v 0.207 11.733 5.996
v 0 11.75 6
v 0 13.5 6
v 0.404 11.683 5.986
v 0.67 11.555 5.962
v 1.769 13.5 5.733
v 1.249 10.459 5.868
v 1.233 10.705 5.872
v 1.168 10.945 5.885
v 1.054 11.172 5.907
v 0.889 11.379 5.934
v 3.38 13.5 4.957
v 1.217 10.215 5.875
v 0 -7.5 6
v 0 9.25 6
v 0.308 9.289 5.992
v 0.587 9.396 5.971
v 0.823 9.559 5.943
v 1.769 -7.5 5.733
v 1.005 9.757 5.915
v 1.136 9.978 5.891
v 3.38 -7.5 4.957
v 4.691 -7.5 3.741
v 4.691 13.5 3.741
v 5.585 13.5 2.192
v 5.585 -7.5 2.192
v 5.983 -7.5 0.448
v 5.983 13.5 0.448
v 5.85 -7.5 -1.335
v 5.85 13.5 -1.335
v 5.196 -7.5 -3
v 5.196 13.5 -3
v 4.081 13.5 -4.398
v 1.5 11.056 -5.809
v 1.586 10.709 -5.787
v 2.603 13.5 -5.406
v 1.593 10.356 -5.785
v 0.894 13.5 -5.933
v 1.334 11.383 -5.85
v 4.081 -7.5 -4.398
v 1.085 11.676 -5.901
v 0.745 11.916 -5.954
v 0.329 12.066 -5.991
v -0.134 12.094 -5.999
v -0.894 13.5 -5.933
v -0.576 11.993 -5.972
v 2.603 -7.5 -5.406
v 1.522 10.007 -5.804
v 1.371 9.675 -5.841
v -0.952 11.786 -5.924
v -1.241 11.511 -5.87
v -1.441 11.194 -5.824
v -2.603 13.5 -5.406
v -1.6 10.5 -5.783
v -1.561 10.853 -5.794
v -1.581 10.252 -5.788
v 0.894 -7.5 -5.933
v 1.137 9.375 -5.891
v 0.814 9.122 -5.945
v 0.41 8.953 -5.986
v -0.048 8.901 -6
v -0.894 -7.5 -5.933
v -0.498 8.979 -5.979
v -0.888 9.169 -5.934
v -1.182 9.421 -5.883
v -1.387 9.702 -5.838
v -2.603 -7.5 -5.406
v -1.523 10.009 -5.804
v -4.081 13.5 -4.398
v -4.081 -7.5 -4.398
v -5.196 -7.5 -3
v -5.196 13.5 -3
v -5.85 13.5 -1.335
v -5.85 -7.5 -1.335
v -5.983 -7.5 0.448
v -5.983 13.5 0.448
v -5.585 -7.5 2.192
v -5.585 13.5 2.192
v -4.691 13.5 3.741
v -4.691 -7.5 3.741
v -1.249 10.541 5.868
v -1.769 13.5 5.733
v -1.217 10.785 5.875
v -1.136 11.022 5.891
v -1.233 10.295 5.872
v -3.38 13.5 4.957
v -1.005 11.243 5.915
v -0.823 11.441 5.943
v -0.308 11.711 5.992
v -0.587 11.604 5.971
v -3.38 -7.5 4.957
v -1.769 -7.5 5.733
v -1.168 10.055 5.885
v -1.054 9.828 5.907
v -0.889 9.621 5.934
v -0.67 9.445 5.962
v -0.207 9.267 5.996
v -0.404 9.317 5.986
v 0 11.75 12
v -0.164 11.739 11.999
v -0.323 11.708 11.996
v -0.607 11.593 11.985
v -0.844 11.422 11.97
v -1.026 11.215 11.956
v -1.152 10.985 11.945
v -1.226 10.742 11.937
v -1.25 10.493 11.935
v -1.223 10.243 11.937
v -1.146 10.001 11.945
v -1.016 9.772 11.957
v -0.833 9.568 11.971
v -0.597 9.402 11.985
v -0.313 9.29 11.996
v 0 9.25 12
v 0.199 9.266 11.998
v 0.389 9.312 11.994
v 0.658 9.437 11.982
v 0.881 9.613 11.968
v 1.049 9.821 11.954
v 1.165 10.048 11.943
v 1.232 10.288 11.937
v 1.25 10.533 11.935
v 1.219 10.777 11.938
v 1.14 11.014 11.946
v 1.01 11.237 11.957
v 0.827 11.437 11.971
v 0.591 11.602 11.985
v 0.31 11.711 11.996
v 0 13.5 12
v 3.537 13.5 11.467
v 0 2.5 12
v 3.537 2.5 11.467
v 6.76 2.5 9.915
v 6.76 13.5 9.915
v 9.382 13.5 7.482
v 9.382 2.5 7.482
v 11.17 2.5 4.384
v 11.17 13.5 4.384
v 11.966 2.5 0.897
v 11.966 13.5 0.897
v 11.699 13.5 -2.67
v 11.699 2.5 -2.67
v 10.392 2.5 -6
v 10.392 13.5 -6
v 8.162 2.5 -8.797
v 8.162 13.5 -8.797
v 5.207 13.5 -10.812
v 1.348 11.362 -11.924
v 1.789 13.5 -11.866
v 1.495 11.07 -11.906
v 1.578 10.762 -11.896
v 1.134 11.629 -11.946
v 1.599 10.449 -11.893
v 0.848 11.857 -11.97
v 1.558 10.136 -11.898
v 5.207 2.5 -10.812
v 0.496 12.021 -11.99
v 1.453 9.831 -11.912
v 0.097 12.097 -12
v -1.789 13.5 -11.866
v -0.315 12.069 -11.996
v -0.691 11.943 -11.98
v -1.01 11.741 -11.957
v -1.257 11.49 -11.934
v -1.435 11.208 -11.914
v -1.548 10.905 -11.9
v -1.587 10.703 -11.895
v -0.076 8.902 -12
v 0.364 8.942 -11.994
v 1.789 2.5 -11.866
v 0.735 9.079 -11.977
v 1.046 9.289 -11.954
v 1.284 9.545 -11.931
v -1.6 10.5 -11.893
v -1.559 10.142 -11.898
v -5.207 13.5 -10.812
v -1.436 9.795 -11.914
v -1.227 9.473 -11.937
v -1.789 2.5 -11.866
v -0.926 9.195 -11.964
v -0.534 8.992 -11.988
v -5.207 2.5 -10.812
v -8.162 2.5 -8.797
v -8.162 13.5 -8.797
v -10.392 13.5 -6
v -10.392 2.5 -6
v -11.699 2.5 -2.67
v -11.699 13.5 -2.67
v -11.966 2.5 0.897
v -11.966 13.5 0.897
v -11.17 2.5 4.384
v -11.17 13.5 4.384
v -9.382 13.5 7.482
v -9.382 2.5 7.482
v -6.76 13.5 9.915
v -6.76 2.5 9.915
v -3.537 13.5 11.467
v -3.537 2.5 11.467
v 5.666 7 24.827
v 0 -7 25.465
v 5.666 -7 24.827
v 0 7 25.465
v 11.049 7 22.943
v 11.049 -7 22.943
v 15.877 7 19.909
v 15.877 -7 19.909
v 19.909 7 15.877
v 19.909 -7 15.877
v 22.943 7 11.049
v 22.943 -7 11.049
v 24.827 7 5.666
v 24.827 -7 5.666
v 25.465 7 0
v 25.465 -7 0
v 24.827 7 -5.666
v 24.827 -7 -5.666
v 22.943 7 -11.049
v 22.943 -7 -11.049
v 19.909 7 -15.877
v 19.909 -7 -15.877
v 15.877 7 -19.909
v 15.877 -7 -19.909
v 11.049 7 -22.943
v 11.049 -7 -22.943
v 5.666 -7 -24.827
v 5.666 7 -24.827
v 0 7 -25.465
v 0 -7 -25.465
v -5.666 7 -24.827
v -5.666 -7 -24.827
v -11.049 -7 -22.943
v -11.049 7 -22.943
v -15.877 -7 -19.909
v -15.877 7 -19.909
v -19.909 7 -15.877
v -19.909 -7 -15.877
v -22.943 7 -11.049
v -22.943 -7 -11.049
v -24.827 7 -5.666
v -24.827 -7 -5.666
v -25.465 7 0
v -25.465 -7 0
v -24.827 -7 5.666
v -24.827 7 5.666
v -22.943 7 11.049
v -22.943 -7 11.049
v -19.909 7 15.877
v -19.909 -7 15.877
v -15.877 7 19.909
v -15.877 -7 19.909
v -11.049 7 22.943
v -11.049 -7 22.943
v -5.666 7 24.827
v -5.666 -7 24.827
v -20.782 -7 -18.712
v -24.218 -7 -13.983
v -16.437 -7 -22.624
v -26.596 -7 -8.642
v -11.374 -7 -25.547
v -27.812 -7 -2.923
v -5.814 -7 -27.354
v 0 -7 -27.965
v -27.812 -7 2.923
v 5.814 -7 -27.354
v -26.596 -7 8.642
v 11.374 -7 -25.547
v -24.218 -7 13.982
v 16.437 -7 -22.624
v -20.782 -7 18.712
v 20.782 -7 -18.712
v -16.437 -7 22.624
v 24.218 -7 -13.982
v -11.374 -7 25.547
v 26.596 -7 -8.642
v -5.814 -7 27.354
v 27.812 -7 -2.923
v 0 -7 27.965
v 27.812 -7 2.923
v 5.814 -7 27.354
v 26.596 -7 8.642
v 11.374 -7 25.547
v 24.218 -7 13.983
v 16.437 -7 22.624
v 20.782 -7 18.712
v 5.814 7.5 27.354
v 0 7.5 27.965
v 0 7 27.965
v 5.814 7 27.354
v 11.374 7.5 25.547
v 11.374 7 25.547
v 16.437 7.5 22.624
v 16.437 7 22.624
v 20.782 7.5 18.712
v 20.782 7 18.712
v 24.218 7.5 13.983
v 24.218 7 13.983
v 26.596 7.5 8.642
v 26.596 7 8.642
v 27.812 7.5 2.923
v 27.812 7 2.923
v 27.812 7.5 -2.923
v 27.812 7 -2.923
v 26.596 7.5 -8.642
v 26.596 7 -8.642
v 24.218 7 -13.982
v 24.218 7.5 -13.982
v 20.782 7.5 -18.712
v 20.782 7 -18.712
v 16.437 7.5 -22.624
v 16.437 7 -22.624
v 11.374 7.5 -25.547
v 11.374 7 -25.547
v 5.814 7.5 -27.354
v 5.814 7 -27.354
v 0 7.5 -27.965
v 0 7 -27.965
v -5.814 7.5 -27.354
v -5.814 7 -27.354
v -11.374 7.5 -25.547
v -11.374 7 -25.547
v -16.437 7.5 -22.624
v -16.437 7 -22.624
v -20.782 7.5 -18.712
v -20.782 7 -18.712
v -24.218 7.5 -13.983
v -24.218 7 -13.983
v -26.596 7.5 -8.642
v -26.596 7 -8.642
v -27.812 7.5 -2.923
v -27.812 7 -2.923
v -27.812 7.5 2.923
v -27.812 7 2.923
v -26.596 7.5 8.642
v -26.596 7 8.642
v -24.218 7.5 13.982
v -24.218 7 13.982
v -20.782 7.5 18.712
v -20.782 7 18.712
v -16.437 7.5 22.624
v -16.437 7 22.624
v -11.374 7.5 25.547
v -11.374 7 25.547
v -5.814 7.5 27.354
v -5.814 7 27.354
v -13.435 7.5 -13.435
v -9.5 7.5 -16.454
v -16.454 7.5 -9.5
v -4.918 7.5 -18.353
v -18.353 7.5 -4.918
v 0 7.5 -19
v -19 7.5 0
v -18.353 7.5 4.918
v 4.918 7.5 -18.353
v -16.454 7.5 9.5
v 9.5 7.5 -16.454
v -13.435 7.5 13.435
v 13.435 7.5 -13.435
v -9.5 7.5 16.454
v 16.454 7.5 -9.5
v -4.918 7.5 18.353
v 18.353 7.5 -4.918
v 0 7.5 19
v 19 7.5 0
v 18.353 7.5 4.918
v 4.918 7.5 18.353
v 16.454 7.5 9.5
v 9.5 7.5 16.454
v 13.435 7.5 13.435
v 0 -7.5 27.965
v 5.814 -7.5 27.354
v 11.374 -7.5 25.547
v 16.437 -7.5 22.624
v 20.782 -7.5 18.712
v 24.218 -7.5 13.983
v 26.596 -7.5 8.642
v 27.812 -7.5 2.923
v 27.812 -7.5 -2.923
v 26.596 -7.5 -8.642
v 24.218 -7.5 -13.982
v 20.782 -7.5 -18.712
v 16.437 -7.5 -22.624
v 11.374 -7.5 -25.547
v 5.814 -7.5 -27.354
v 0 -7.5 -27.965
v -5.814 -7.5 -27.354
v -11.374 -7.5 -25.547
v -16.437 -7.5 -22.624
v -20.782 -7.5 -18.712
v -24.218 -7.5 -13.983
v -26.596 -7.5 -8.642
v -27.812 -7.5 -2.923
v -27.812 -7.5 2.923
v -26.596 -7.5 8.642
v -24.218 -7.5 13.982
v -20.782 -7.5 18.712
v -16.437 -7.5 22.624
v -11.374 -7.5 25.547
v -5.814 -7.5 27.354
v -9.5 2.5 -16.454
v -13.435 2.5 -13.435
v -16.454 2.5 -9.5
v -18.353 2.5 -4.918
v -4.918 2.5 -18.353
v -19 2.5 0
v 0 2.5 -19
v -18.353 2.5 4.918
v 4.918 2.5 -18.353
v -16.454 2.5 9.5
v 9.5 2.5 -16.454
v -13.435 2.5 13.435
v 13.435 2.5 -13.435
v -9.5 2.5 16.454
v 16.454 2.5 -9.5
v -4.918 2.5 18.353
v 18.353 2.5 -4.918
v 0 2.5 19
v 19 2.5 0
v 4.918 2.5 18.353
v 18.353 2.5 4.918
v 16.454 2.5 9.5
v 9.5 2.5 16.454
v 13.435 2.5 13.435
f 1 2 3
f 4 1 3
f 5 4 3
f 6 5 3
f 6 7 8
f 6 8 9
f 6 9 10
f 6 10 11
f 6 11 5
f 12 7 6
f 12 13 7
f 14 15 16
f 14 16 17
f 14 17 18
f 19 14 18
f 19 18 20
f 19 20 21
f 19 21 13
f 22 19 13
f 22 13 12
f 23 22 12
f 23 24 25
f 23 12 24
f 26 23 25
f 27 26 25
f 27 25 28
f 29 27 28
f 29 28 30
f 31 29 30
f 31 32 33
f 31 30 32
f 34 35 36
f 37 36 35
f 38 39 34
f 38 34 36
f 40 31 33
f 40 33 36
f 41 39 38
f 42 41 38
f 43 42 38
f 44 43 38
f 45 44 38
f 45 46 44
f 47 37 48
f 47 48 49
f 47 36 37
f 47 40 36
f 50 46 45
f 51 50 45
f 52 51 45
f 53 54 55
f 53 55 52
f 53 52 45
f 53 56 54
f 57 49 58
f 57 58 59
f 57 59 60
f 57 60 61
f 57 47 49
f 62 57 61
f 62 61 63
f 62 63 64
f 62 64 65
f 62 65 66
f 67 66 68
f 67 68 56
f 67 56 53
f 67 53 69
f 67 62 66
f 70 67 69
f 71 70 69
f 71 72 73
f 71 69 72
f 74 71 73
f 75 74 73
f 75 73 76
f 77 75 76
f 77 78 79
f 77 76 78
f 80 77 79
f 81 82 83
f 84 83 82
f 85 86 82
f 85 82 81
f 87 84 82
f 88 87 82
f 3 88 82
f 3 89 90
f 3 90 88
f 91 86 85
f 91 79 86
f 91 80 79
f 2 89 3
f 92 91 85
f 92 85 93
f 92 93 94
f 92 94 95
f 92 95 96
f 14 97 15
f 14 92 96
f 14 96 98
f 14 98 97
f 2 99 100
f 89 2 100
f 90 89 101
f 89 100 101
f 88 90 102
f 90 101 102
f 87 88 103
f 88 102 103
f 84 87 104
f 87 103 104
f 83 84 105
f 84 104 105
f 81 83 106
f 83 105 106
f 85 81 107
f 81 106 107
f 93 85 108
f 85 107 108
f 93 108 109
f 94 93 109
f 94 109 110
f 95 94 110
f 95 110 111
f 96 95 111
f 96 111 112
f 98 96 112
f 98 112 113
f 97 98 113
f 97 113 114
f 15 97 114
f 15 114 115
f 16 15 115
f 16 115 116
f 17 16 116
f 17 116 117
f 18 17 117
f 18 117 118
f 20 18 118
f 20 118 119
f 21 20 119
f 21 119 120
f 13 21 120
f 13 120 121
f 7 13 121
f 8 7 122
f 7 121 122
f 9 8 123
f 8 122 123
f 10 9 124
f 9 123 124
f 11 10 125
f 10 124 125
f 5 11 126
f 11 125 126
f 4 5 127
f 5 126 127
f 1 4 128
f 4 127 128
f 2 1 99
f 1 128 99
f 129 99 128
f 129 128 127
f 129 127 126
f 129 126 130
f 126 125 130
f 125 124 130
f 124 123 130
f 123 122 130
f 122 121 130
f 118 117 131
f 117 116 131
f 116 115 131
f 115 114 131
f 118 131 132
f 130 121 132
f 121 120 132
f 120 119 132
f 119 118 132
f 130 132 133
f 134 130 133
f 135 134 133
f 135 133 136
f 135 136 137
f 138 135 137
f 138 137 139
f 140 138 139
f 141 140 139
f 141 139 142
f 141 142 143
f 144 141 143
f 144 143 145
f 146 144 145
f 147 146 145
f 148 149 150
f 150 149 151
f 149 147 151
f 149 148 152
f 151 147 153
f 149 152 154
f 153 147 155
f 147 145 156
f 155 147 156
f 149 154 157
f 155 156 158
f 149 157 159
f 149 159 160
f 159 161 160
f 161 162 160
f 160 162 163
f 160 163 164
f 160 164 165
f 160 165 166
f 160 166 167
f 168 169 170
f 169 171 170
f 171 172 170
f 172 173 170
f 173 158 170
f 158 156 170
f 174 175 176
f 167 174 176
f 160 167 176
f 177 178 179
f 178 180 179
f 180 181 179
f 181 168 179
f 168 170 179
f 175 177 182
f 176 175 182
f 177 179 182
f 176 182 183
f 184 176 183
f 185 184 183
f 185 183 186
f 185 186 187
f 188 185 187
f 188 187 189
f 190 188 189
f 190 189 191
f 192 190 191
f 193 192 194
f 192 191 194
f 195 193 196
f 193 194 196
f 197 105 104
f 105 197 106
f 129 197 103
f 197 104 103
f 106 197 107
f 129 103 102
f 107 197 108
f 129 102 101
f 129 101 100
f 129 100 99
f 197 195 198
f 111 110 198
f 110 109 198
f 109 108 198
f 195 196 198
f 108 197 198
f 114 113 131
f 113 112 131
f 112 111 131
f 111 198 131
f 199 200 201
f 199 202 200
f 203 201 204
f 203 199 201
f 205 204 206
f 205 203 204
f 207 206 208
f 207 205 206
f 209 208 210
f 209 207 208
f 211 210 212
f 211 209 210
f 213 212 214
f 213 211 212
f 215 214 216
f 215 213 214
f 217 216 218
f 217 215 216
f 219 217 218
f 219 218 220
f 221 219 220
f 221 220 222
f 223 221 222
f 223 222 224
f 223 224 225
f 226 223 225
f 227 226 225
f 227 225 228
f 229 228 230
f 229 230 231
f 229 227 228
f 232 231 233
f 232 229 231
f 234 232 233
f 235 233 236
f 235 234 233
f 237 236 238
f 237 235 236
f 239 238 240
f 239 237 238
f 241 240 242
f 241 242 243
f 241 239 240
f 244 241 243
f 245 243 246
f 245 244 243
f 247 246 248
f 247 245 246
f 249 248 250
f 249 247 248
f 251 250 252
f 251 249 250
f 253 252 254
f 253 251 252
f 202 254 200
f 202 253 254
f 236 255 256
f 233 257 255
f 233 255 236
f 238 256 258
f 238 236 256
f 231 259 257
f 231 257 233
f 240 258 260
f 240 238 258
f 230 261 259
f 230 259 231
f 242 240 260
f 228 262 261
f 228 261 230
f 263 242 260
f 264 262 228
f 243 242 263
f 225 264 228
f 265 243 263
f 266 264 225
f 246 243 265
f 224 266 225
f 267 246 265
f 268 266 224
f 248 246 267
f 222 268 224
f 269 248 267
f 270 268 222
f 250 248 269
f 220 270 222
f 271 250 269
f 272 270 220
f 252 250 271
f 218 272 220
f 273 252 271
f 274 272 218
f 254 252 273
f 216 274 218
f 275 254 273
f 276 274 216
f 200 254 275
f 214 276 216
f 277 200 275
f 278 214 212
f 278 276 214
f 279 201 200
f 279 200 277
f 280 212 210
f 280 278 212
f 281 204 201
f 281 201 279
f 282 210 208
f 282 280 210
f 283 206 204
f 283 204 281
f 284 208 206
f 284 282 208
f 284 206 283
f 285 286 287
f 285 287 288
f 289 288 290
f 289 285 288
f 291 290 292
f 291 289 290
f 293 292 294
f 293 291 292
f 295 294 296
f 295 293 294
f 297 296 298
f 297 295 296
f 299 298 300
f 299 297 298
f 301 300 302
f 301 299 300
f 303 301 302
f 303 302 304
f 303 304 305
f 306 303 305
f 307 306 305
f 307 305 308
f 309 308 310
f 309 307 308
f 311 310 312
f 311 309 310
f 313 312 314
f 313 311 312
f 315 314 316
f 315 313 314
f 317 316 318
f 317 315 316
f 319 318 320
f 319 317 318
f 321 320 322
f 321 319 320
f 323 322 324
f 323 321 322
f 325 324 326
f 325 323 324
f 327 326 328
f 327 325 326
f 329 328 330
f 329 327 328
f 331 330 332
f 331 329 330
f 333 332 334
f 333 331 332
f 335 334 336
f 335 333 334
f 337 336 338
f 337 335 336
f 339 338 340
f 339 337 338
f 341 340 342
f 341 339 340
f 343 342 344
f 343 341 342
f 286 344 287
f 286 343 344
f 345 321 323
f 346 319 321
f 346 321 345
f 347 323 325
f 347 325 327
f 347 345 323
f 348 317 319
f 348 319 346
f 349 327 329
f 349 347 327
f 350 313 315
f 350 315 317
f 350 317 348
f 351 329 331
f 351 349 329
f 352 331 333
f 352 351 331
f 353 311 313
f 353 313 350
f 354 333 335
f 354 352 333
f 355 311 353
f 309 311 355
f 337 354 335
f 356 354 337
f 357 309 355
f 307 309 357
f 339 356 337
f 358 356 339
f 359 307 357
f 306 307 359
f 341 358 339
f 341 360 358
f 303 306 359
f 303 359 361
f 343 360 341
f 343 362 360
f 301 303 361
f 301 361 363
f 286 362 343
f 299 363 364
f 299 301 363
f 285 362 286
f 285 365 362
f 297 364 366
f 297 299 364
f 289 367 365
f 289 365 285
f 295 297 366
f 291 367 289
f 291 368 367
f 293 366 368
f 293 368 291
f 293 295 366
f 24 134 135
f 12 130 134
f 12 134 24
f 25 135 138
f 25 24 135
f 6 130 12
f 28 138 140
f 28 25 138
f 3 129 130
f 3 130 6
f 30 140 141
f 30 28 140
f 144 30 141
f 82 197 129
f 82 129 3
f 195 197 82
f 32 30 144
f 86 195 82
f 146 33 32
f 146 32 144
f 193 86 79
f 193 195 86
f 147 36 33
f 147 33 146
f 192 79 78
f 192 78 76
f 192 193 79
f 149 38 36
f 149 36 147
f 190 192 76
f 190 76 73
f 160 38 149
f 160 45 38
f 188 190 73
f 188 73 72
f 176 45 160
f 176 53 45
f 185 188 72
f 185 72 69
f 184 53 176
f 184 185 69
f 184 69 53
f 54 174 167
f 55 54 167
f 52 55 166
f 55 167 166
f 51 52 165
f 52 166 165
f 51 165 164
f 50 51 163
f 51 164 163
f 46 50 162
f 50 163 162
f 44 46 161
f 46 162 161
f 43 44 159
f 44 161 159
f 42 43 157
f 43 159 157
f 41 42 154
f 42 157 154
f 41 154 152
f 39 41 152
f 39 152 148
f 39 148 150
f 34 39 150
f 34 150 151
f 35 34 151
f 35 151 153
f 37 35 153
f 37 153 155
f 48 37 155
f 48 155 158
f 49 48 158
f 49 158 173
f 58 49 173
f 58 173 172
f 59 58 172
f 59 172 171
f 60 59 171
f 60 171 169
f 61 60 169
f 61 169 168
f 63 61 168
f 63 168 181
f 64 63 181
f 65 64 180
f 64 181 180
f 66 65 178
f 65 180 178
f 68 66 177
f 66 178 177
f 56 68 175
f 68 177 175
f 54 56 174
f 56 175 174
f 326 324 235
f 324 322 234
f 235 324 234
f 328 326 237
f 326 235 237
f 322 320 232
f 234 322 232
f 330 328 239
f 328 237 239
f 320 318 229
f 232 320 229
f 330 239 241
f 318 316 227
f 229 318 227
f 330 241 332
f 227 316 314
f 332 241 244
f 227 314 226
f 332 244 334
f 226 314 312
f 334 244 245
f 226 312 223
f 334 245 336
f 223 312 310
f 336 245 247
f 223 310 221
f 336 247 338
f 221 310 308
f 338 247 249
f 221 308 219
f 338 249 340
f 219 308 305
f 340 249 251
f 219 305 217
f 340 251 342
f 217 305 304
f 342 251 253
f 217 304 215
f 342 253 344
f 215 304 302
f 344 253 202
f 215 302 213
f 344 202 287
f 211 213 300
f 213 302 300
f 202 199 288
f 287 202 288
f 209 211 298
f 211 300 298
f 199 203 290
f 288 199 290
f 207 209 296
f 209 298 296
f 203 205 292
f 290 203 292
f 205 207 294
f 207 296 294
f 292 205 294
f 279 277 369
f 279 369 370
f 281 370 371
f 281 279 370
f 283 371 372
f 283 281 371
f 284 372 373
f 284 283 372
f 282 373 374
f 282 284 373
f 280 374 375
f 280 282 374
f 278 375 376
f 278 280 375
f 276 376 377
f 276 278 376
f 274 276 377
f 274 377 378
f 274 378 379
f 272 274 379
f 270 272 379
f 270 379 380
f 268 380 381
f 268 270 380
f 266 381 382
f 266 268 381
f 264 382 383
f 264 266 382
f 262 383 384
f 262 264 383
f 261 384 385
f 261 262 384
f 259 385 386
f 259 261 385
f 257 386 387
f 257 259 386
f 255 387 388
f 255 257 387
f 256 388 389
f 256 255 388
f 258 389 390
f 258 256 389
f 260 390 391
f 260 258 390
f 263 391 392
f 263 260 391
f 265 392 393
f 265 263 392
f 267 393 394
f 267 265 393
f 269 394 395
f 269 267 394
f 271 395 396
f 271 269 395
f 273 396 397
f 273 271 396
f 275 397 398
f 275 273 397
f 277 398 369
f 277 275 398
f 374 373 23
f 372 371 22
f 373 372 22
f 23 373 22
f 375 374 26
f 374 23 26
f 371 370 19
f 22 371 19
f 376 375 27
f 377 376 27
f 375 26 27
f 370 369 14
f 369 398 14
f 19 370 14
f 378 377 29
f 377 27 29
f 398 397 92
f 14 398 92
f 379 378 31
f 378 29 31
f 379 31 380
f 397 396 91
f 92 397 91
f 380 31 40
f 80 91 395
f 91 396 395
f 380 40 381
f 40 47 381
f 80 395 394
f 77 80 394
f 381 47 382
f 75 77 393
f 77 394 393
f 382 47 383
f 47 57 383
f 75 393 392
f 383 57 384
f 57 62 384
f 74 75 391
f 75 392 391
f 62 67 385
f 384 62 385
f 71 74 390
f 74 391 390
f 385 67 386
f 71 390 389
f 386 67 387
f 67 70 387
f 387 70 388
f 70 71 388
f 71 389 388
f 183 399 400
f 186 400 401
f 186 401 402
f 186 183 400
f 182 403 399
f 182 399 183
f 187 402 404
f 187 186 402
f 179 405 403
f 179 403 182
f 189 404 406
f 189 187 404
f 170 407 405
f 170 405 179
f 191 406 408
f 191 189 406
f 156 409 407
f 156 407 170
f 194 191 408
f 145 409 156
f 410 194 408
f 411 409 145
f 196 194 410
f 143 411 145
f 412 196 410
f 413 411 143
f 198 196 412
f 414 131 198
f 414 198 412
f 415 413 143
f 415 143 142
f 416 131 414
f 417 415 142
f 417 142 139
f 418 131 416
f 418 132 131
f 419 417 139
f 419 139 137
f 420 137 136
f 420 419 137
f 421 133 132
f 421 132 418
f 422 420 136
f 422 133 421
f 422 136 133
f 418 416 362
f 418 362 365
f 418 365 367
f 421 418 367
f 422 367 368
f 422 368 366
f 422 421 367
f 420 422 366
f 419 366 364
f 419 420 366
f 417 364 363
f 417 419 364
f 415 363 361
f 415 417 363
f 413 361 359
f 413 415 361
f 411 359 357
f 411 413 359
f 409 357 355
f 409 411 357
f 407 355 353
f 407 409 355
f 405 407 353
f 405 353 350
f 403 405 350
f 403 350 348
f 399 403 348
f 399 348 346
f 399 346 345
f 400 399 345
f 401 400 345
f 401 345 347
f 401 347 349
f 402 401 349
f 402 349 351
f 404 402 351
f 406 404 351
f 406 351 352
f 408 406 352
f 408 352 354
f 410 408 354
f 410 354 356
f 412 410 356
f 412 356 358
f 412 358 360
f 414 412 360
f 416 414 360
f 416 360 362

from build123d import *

# Parameters (mm, degrees)
CROQUIS1_R                                     = 25.465
SALIENTE_EXTRUIR1_DEPTH                        = 7.5
CROQUIS2_R                                     = 27.965
SALIENTE_EXTRUIR2_DEPTH                        = 0.5
SALIENTE_EXTRUIR3_START                        = -14.5
CROQUIS2_2_R                                   = 27.965
SALIENTE_EXTRUIR3_DEPTH                        = 0.5
CROQUIS3_R                                     = 19
SALIENTE_EXTRUIR4_DEPTH                        = 21
CORTAR_EXTRUIR1_DEPTH                          = 45.545846608
CORTAR_EXTRUIR1_DEPTH_BACK                     = 45.545846608
CROQUIS4_R                                     = 6
CORTAR_EXTRUIR2_START                          = -11
CROQUIS5_R                                     = 19
CROQUIS5_R_2                                   = 12
CORTAR_EXTRUIR2_DEPTH                          = 11
PERFORADOR_PARA_ROSCAR_PARA_MACHO_DE_ROS_REACH = 60.109
PERFORADOR_PARA_ROSCAR_PARA_MACHO_DE_2_R       = 1.25
TALADRO_DE_MARGEN_PARA_M32_REACH               = 52.611
TALADRO_DE_MARGEN_PARA_M32_BORE_R              = 1.6


with BuildPart() as part:
    # Croquis1 → Saliente-Extruir1 (new, symmetric)
    with BuildSketch(Plane(origin=(0, 0, 0), x_dir=(-1, 0, 0), z_dir=(0, 1, 0))):
        with Locations(Location((0, 0, 0), (0, 0, 90))):
            Circle(CROQUIS1_R)
    extrude(amount=SALIENTE_EXTRUIR1_DEPTH, both=True)

    # Croquis2 → Saliente-Extruir2 (add)
    with BuildSketch(Plane(origin=(0, 7.5, 0), x_dir=(-1, 0, 0), z_dir=(0, 1, 0))):
        with Locations(Location((0, 0, 0), (0, 0, 90))):
            Circle(CROQUIS2_R)
    extrude(amount=-SALIENTE_EXTRUIR2_DEPTH)

    # Croquis2<2> → Saliente-Extruir3 (add)
    with BuildSketch(Plane(origin=(0, 7.5, 0), x_dir=(-1, 0, 0), z_dir=(0, 1, 0)).offset(SALIENTE_EXTRUIR3_START)):
        with Locations(Location((0, 0, 0), (0, 0, 90))):
            Circle(CROQUIS2_2_R)
    extrude(amount=-SALIENTE_EXTRUIR3_DEPTH)

    # Croquis3 → Saliente-Extruir4 (add)
    with BuildSketch(Plane(origin=(0, -7.5, 0), x_dir=(-1, 0, 0), z_dir=(0, 1, 0))):
        with Locations(Location((0, 0, 0), (0, 0, 270))):
            Circle(CROQUIS3_R)
    extrude(amount=SALIENTE_EXTRUIR4_DEPTH)

    # Croquis4 → Cortar-Extruir1 (cut, two sides: drawn at the far end of the back side and taken through both)
    with BuildSketch(Plane(origin=(0, -7, 0), x_dir=(-1, 0, 0), z_dir=(0, 1, 0)).offset(-CORTAR_EXTRUIR1_DEPTH_BACK)):
        with Locations(Location((0, 0, 0), (0, 0, 90))):
            Circle(CROQUIS4_R)
    extrude(amount=CORTAR_EXTRUIR1_DEPTH + CORTAR_EXTRUIR1_DEPTH_BACK, mode=Mode.SUBTRACT)

    # Croquis5 → Cortar-Extruir2 (cut)
    with BuildSketch(Plane(origin=(0, 13.5, 0), x_dir=(-1, 0, 0), z_dir=(0, 1, 0)).offset(CORTAR_EXTRUIR2_START)):
        with Locations(Location((0, 0, 0), (0, 0, 90))):
            Circle(CROQUIS5_R)
        with Locations(Location((0, 0, 0), (0, 0, 90))):
            Circle(CROQUIS5_R_2, mode=Mode.SUBTRACT)
    extrude(amount=CORTAR_EXTRUIR2_DEPTH, mode=Mode.SUBTRACT)

    # Perforador para roscar para macho de 2 → Perforador para roscar para macho de roscar para M31 (cut, up to next)
    with BuildSketch(Plane(origin=(-12, 0, 12), x_dir=(0, 1, 0), z_dir=(0, 0, 1)), mode=Mode.PRIVATE) as perforador_para_roscar_para_macho_de_ros_sk1:
        with Locations((10.5, -12)):
            Circle(PERFORADOR_PARA_ROSCAR_PARA_MACHO_DE_2_R)
    perforador_para_roscar_para_macho_de_ros_tool1 = extrude(perforador_para_roscar_para_macho_de_ros_sk1.sketch, amount=-PERFORADOR_PARA_ROSCAR_PARA_MACHO_DE_ROS_REACH, mode=Mode.PRIVATE) & part.part
    add(perforador_para_roscar_para_macho_de_ros_tool1.solids().sort_by_distance((0, 10.5, 12))[0], mode=Mode.SUBTRACT)

    # Taladro de margen para M32 bore → Taladro de margen para M32 (cut, up to next)
    with BuildSketch(Plane(origin=(0, 0, -12), x_dir=(-1, 0, 0), z_dir=(0, 0, -1)), mode=Mode.PRIVATE) as taladro_de_margen_para_m32_sk1:
        with Locations((0, 10.5)):
            Circle(TALADRO_DE_MARGEN_PARA_M32_BORE_R)
    taladro_de_margen_para_m32_tool1 = extrude(taladro_de_margen_para_m32_sk1.sketch, amount=-TALADRO_DE_MARGEN_PARA_M32_REACH, mode=Mode.PRIVATE) & part.part
    add(taladro_de_margen_para_m32_tool1.solids().sort_by_distance((0, 10.5, -12))[0], mode=Mode.SUBTRACT)


solid = part.part
